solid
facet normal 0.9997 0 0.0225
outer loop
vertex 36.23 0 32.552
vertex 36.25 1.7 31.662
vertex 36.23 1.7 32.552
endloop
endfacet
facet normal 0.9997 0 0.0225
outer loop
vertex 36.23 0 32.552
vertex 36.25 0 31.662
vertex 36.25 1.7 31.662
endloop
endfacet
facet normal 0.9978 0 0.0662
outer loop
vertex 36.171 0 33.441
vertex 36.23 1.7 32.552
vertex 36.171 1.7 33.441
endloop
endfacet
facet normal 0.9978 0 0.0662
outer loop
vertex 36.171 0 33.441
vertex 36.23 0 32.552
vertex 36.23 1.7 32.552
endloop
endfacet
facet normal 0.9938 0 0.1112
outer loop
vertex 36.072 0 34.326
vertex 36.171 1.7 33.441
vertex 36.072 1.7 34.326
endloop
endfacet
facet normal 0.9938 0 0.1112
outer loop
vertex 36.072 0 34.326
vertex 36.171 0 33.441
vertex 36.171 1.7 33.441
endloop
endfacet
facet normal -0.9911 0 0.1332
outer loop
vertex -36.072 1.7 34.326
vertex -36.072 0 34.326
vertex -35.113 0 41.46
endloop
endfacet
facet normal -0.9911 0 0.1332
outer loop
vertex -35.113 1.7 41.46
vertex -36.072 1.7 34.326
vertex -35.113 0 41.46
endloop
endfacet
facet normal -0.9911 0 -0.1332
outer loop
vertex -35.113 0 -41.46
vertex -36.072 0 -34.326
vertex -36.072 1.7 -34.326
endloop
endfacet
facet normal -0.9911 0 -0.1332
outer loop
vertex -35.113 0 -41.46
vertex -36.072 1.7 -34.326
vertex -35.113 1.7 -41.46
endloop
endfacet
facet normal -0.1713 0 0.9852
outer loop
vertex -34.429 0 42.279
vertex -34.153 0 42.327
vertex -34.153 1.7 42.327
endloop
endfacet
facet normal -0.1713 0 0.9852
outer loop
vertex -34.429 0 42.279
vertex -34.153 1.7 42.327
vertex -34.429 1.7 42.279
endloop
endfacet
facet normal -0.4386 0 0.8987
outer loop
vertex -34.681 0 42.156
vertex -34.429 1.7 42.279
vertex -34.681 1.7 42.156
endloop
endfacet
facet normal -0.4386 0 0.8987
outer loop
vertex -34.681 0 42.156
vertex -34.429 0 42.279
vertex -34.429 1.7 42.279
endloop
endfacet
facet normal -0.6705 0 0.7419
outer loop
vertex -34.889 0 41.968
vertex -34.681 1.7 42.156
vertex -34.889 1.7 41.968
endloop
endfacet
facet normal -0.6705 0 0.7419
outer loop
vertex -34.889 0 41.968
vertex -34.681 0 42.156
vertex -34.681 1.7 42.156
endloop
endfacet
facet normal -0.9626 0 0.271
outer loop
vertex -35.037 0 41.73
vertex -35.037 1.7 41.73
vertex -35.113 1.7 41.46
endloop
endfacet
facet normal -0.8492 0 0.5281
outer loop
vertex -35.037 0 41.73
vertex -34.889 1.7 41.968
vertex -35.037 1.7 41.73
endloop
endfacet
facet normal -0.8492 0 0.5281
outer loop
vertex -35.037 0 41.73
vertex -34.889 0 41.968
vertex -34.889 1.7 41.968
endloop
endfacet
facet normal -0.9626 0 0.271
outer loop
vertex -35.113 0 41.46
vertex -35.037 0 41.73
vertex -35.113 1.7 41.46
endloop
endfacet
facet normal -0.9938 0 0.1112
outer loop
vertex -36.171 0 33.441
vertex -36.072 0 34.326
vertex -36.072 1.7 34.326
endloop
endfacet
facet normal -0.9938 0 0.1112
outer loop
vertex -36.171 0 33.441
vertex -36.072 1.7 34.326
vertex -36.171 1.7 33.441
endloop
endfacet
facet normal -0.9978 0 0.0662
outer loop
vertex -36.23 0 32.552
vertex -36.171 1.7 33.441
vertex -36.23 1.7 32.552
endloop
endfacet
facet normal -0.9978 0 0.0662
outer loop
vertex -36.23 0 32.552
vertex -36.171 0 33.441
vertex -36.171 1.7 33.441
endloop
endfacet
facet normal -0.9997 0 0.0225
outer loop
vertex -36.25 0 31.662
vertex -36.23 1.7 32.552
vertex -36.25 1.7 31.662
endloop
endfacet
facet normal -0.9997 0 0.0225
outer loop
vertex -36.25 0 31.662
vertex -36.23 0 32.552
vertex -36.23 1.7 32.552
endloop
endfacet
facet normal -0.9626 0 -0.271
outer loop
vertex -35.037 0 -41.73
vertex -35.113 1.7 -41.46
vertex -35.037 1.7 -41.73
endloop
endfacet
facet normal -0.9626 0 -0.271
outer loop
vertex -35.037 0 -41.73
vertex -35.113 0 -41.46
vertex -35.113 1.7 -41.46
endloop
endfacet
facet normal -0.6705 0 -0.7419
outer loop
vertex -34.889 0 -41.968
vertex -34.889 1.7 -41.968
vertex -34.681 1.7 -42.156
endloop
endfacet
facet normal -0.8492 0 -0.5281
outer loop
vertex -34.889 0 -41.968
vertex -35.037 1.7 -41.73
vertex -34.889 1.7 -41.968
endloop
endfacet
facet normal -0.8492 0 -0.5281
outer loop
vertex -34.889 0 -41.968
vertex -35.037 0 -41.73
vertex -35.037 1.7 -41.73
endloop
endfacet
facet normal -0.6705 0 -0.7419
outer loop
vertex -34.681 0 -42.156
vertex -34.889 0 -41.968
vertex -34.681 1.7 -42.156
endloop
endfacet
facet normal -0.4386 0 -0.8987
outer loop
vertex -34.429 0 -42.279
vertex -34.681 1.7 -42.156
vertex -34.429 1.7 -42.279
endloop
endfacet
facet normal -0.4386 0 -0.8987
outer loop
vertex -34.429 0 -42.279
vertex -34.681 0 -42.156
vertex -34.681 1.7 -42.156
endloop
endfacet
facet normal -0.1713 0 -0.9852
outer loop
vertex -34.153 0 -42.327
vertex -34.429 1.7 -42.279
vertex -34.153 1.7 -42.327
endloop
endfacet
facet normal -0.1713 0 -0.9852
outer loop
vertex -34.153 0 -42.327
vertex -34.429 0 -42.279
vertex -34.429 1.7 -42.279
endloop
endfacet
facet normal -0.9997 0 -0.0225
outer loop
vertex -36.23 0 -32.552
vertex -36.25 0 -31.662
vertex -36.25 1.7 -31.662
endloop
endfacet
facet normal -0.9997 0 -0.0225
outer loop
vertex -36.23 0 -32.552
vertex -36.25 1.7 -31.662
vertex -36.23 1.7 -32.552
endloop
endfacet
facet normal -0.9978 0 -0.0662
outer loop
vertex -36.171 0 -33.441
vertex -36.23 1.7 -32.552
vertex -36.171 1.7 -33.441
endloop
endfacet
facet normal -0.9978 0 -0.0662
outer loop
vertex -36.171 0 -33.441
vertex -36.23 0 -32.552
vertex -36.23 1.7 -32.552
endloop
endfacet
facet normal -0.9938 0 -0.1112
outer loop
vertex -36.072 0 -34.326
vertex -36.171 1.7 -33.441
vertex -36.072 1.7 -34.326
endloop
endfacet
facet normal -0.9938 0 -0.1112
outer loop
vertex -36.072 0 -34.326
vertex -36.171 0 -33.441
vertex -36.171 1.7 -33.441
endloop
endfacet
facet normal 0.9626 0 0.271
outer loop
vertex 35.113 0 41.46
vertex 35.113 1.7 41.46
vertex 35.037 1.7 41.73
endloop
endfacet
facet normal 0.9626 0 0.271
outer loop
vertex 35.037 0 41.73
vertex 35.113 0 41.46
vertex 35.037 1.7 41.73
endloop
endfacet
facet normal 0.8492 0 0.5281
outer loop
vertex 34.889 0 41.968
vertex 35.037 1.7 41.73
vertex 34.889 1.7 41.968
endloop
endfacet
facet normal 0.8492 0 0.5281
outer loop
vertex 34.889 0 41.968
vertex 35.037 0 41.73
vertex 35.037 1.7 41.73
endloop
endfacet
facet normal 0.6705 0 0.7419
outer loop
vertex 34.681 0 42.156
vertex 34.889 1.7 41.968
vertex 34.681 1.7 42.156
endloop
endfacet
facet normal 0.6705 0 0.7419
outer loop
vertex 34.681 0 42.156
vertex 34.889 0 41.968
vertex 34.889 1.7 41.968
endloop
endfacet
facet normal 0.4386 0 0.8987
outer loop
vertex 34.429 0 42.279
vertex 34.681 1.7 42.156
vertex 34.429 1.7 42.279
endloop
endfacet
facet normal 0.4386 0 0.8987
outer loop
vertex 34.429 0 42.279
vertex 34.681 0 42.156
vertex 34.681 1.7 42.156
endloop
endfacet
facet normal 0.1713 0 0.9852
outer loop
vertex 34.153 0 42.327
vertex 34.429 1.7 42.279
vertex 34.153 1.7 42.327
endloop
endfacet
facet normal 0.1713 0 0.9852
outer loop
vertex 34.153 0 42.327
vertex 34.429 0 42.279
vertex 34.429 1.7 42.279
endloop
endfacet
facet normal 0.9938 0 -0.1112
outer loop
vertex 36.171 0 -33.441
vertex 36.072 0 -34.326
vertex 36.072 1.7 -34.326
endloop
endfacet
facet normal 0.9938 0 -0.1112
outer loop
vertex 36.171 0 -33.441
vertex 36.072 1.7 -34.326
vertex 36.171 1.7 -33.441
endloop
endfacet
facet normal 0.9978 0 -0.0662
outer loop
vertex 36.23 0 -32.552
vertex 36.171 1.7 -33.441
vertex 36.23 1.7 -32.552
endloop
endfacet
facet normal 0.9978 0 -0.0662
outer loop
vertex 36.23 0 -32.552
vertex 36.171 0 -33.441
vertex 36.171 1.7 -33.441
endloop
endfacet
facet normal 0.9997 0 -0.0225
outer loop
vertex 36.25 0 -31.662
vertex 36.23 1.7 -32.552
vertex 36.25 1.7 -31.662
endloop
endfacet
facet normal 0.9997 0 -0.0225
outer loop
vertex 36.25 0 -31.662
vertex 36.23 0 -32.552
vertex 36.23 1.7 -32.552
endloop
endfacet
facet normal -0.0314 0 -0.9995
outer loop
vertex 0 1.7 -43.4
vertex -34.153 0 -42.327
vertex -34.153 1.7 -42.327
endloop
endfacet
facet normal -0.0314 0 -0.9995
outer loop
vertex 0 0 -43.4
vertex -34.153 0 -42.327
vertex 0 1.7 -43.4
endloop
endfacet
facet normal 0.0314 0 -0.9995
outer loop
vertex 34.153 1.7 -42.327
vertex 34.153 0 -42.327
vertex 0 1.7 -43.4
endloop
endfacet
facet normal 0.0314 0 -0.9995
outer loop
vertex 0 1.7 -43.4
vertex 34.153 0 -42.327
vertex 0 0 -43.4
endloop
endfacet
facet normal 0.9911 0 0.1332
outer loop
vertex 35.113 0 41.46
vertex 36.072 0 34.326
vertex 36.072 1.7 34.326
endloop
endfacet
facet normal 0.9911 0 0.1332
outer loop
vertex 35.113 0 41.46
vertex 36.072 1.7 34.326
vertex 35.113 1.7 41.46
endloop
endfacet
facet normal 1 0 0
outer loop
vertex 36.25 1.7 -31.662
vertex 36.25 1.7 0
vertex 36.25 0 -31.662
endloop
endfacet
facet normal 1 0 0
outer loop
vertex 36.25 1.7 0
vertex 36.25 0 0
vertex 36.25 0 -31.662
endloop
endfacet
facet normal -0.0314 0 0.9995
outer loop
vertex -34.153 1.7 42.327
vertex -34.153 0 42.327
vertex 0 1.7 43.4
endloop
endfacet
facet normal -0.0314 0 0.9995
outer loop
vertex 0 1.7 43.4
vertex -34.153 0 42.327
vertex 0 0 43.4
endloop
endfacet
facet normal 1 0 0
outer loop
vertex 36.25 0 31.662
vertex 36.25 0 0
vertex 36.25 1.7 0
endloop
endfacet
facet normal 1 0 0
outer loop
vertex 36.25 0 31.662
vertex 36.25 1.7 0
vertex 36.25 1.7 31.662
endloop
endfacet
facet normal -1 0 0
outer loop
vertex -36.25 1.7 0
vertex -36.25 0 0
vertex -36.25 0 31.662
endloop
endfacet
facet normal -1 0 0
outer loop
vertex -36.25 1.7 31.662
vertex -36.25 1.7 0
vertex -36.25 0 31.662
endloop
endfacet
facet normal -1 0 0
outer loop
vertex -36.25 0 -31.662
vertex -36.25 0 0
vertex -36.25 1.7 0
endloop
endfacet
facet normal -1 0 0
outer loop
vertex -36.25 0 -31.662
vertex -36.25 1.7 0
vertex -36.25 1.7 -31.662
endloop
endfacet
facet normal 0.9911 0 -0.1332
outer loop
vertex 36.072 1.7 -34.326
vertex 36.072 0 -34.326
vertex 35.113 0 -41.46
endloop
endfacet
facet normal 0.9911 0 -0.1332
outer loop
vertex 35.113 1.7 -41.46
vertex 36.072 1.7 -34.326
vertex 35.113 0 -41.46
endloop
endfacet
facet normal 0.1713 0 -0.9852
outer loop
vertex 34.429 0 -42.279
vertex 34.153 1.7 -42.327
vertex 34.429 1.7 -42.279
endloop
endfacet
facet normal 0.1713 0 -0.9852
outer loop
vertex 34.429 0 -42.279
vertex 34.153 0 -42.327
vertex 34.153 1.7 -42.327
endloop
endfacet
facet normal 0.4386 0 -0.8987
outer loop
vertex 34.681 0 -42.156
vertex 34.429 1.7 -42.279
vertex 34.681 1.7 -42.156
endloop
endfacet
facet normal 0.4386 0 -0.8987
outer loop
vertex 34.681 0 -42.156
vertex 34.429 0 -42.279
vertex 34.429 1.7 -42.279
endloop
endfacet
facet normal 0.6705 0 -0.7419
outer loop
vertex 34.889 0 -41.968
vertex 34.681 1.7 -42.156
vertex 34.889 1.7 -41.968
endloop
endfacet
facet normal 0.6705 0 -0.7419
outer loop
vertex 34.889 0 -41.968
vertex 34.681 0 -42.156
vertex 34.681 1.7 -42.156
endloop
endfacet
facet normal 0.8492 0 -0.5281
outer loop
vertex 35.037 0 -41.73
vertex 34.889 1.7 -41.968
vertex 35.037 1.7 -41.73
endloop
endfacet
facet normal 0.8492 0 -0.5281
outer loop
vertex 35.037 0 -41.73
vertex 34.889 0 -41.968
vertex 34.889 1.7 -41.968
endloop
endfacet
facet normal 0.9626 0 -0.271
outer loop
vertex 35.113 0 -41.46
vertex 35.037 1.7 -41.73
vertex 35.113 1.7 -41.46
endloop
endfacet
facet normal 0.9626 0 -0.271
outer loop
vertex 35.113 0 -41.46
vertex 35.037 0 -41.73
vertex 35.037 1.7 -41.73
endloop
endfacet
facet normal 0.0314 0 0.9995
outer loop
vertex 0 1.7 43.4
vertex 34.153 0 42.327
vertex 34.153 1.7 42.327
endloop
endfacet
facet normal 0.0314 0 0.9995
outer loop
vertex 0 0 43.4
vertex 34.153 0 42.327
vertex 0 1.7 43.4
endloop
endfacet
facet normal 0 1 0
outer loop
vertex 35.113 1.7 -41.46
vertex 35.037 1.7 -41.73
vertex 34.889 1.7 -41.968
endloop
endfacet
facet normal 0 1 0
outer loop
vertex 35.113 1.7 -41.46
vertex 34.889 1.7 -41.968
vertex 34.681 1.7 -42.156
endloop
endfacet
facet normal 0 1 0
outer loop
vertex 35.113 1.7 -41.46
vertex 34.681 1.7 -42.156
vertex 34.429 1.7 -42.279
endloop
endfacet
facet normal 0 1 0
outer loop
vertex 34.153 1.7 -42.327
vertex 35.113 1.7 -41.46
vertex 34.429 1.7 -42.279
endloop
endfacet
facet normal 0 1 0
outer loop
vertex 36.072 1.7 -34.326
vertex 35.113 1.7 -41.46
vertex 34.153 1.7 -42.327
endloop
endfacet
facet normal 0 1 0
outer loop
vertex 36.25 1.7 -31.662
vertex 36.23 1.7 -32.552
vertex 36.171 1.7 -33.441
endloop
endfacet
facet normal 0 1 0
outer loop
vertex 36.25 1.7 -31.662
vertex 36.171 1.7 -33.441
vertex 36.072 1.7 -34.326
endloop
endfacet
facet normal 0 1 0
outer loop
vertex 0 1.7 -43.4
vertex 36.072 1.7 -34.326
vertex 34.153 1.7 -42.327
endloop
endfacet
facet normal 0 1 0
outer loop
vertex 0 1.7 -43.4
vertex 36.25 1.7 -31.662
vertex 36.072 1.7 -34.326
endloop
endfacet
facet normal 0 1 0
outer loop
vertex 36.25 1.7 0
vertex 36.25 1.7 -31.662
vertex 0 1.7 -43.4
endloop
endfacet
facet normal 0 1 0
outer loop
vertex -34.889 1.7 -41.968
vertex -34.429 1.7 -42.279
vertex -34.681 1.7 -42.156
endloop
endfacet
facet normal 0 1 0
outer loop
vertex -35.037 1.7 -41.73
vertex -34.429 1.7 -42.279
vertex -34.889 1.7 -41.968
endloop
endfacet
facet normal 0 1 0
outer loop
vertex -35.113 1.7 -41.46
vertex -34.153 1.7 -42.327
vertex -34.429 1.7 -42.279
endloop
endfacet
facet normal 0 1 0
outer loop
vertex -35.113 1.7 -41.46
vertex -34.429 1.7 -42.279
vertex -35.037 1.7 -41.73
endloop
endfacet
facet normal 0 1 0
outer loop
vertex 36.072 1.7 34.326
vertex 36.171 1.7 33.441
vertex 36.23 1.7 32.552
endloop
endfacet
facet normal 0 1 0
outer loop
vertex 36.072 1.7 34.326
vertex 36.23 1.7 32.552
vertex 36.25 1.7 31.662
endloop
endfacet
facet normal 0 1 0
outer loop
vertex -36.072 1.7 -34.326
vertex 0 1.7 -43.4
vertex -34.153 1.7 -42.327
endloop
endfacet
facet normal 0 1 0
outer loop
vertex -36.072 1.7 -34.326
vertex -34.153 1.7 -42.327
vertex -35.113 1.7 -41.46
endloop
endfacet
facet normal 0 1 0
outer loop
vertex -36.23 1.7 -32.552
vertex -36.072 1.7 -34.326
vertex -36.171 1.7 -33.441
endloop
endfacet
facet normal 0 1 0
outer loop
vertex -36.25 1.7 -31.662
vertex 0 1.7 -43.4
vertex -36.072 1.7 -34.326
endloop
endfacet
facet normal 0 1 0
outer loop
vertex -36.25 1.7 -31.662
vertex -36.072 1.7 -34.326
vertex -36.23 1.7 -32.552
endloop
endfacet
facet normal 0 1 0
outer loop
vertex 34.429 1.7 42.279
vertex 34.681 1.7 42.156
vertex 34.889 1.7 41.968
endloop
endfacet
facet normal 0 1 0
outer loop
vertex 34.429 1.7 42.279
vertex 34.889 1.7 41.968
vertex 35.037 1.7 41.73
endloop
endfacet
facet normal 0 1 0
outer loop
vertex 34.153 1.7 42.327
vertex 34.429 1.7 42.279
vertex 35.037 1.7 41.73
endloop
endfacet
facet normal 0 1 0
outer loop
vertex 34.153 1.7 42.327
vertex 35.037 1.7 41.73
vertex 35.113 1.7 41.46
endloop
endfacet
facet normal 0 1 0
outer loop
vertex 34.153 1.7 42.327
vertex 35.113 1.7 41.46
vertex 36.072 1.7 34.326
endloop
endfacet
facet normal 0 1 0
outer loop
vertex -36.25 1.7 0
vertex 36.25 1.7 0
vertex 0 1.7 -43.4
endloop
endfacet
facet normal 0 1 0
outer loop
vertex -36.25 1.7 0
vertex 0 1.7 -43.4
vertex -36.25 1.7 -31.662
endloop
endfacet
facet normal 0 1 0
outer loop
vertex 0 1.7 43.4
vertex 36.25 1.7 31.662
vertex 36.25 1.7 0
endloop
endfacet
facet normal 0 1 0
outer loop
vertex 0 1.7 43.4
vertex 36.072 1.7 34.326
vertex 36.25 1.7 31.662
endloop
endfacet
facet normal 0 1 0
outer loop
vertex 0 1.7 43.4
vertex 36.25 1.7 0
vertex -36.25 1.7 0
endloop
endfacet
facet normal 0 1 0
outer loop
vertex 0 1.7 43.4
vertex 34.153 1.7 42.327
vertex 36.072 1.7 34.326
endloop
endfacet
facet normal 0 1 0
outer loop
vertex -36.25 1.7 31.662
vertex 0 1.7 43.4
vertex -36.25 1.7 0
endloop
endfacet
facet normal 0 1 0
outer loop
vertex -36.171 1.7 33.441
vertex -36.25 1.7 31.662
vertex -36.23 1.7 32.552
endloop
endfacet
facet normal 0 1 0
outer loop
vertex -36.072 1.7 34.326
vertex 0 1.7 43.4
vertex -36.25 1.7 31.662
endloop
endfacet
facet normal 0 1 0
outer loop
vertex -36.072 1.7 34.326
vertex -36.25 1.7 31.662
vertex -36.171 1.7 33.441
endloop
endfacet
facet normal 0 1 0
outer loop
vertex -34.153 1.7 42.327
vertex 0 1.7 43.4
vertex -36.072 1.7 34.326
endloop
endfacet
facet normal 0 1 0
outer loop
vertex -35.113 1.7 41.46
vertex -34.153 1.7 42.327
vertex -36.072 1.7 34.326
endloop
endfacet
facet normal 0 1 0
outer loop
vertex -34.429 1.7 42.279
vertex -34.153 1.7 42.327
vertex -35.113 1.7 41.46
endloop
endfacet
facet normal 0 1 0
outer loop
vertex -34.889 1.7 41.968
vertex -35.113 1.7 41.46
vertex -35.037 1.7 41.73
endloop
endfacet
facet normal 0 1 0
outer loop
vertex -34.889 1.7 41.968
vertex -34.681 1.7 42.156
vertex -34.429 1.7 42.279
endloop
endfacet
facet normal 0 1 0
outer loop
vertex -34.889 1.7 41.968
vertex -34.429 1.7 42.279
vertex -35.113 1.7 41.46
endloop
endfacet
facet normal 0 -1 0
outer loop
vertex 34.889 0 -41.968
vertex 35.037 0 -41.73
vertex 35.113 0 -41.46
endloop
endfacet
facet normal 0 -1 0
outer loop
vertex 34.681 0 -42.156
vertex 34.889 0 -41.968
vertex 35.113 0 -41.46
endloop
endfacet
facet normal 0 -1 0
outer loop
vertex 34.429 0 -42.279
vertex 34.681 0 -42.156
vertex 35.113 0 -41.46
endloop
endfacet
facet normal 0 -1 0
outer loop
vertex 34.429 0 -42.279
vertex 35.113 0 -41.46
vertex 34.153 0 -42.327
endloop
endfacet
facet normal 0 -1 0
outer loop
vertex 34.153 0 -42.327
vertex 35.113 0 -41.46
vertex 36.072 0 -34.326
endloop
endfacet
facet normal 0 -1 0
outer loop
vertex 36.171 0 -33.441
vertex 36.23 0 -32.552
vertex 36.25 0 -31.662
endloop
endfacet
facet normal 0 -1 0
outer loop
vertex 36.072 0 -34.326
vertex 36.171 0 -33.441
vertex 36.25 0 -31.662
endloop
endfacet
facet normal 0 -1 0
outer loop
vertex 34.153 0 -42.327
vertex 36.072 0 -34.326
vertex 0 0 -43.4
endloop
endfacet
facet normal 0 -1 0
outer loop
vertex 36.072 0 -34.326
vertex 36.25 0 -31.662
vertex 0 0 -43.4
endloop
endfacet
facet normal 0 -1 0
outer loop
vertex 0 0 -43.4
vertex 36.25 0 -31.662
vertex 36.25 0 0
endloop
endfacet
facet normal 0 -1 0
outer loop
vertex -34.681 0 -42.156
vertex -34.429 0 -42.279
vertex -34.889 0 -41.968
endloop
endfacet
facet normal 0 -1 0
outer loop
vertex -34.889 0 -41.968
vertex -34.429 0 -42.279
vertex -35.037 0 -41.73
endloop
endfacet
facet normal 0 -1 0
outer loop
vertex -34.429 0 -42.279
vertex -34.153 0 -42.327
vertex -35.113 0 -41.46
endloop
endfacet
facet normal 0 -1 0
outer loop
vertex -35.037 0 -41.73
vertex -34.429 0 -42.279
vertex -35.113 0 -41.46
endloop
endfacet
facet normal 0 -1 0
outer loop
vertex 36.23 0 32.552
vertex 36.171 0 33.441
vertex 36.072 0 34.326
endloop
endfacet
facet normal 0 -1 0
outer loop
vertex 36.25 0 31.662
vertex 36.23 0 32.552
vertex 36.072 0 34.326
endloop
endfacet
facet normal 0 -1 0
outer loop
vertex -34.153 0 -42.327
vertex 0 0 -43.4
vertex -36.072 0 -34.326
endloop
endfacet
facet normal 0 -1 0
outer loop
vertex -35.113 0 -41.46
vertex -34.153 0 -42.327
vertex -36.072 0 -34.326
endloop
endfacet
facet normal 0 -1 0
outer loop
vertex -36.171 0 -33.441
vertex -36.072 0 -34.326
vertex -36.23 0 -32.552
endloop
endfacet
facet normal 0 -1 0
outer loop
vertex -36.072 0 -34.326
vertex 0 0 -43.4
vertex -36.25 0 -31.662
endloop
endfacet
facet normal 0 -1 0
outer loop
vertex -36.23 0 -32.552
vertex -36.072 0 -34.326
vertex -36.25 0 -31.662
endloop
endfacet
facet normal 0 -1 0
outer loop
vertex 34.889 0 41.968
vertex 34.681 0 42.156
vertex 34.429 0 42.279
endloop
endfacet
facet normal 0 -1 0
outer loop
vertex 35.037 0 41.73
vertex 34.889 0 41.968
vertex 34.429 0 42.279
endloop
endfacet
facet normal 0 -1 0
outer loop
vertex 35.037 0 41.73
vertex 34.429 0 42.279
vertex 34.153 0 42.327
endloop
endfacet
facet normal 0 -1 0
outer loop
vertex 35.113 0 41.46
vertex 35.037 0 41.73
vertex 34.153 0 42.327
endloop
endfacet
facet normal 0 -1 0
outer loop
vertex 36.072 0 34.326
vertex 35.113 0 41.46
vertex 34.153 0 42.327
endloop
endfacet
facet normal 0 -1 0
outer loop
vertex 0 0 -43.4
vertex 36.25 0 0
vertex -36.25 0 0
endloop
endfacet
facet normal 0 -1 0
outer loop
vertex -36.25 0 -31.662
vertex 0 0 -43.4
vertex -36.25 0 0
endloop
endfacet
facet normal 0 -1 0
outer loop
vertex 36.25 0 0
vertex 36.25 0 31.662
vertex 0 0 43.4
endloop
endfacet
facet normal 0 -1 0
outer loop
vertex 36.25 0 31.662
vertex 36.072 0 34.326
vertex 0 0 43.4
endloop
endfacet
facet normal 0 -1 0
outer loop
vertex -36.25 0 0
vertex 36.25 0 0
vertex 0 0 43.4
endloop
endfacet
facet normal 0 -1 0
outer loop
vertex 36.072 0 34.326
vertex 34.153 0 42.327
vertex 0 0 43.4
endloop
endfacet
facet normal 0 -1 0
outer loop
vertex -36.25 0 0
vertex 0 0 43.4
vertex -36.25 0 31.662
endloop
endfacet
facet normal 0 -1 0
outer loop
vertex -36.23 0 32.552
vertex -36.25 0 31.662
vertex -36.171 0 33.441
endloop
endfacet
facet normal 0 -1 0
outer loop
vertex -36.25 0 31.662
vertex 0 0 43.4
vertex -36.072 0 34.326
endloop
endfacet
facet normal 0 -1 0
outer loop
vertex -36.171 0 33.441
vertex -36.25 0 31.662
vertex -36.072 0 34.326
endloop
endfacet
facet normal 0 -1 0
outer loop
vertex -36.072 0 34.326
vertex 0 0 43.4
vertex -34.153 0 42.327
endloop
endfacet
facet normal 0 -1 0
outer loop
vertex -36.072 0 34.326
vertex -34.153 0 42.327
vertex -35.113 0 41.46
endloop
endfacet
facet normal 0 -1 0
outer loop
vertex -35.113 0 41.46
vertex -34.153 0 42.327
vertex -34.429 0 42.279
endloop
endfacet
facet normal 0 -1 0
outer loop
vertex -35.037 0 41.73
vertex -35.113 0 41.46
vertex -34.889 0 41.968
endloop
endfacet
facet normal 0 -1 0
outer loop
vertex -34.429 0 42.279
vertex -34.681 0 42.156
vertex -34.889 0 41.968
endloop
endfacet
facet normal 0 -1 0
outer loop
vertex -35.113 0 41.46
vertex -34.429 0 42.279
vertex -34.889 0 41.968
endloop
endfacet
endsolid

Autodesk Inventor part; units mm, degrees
ref_plane "YZ Plane" through (0, 0, 0) normal (1, 0, 0) x (0, 1, 0)
ref_plane "XZ Plane" through (0, 0, 0) normal (0, 1, 0) x (-1, 0, 0)
ref_plane "XY Plane" through (0, 0, 0) normal (0, 0, 1) x (1, 0, 0)
sketch "Sketch1" plane through (0, 0, 0) normal (0, 1, 0) x (-1, 0, 0)
  line L0 (0, 0) -> (36.25, 0) construction
  line L1 (36.25, 0) -> (36.25, 31.6619)
  line L2 (36.0718, 34.3261) -> (35.1129, 41.4603)
  line L3 (34.1532, 42.3266) -> (0, 43.4)
  line L4 (0, 43.4) -> (0, 0) construction
  arc A0 (35.1129, 41.4603) -> (34.1532, 42.3266) centre (34.1218, 41.3271) ccw
  arc A1 (36.25, 31.6619) -> (36.0718, 34.3261) centre (16.25, 31.6619) ccw
  line L5 (36.25, 0) -> (36.25, -31.6619)
  line L6 (36.0718, -34.3261) -> (35.1129, -41.4603)
  line L7 (34.1532, -42.3266) -> (0, -43.4)
  arc A2 (34.1532, -42.3266) -> (35.1129, -41.4603) centre (34.1218, -41.3271) ccw
  arc A3 (36.0718, -34.3261) -> (36.25, -31.6619) centre (16.25, -31.6619) ccw
  line L8 (-36.25, 0) -> (-36.25, 31.6619)
  line L9 (-36.0718, 34.3261) -> (-35.1129, 41.4603)
  line L10 (-34.1532, 42.3266) -> (0, 43.4)
  arc A4 (-34.1532, 42.3266) -> (-35.1129, 41.4603) centre (-34.1218, 41.3271) ccw
  arc A5 (-36.0718, 34.3261) -> (-36.25, 31.6619) centre (-16.25, 31.6619) ccw
  line L11 (-36.0718, -34.3261) -> (-35.1129, -41.4603)
  arc A6 (-35.1129, -41.4603) -> (-34.1532, -42.3266) centre (-34.1218, -41.3271) ccw
  arc A7 (-36.25, -31.6619) -> (-36.0718, -34.3261) centre (-16.25, -31.6619) ccw
  line L12 (-36.25, 0) -> (-36.25, -31.6619)
  line L13 (-34.1532, -42.3266) -> (0, -43.4)
  point P0 (36.25, 33)
  point P1 (35, 42.3)
  point P2 (36.25, -33)
  point P3 (35, -42.3)
  point P4 (-36.25, 33)
  point P5 (-35, 42.3)
  point P6 (-36.25, -33)
  point P7 (-35, -42.3)
  dimension "d2" = 36.25
  dimension "d3" = 43.4
  dimension "d6" = 33
  dimension "d7" = 9.3
  dimension "d8" = 35
  dimension "d9" = 1
  dimension "d10" = 20
extrude "Extrusion1" add sketch "Sketch1" along normal blind 1.7
properties part number "End"
